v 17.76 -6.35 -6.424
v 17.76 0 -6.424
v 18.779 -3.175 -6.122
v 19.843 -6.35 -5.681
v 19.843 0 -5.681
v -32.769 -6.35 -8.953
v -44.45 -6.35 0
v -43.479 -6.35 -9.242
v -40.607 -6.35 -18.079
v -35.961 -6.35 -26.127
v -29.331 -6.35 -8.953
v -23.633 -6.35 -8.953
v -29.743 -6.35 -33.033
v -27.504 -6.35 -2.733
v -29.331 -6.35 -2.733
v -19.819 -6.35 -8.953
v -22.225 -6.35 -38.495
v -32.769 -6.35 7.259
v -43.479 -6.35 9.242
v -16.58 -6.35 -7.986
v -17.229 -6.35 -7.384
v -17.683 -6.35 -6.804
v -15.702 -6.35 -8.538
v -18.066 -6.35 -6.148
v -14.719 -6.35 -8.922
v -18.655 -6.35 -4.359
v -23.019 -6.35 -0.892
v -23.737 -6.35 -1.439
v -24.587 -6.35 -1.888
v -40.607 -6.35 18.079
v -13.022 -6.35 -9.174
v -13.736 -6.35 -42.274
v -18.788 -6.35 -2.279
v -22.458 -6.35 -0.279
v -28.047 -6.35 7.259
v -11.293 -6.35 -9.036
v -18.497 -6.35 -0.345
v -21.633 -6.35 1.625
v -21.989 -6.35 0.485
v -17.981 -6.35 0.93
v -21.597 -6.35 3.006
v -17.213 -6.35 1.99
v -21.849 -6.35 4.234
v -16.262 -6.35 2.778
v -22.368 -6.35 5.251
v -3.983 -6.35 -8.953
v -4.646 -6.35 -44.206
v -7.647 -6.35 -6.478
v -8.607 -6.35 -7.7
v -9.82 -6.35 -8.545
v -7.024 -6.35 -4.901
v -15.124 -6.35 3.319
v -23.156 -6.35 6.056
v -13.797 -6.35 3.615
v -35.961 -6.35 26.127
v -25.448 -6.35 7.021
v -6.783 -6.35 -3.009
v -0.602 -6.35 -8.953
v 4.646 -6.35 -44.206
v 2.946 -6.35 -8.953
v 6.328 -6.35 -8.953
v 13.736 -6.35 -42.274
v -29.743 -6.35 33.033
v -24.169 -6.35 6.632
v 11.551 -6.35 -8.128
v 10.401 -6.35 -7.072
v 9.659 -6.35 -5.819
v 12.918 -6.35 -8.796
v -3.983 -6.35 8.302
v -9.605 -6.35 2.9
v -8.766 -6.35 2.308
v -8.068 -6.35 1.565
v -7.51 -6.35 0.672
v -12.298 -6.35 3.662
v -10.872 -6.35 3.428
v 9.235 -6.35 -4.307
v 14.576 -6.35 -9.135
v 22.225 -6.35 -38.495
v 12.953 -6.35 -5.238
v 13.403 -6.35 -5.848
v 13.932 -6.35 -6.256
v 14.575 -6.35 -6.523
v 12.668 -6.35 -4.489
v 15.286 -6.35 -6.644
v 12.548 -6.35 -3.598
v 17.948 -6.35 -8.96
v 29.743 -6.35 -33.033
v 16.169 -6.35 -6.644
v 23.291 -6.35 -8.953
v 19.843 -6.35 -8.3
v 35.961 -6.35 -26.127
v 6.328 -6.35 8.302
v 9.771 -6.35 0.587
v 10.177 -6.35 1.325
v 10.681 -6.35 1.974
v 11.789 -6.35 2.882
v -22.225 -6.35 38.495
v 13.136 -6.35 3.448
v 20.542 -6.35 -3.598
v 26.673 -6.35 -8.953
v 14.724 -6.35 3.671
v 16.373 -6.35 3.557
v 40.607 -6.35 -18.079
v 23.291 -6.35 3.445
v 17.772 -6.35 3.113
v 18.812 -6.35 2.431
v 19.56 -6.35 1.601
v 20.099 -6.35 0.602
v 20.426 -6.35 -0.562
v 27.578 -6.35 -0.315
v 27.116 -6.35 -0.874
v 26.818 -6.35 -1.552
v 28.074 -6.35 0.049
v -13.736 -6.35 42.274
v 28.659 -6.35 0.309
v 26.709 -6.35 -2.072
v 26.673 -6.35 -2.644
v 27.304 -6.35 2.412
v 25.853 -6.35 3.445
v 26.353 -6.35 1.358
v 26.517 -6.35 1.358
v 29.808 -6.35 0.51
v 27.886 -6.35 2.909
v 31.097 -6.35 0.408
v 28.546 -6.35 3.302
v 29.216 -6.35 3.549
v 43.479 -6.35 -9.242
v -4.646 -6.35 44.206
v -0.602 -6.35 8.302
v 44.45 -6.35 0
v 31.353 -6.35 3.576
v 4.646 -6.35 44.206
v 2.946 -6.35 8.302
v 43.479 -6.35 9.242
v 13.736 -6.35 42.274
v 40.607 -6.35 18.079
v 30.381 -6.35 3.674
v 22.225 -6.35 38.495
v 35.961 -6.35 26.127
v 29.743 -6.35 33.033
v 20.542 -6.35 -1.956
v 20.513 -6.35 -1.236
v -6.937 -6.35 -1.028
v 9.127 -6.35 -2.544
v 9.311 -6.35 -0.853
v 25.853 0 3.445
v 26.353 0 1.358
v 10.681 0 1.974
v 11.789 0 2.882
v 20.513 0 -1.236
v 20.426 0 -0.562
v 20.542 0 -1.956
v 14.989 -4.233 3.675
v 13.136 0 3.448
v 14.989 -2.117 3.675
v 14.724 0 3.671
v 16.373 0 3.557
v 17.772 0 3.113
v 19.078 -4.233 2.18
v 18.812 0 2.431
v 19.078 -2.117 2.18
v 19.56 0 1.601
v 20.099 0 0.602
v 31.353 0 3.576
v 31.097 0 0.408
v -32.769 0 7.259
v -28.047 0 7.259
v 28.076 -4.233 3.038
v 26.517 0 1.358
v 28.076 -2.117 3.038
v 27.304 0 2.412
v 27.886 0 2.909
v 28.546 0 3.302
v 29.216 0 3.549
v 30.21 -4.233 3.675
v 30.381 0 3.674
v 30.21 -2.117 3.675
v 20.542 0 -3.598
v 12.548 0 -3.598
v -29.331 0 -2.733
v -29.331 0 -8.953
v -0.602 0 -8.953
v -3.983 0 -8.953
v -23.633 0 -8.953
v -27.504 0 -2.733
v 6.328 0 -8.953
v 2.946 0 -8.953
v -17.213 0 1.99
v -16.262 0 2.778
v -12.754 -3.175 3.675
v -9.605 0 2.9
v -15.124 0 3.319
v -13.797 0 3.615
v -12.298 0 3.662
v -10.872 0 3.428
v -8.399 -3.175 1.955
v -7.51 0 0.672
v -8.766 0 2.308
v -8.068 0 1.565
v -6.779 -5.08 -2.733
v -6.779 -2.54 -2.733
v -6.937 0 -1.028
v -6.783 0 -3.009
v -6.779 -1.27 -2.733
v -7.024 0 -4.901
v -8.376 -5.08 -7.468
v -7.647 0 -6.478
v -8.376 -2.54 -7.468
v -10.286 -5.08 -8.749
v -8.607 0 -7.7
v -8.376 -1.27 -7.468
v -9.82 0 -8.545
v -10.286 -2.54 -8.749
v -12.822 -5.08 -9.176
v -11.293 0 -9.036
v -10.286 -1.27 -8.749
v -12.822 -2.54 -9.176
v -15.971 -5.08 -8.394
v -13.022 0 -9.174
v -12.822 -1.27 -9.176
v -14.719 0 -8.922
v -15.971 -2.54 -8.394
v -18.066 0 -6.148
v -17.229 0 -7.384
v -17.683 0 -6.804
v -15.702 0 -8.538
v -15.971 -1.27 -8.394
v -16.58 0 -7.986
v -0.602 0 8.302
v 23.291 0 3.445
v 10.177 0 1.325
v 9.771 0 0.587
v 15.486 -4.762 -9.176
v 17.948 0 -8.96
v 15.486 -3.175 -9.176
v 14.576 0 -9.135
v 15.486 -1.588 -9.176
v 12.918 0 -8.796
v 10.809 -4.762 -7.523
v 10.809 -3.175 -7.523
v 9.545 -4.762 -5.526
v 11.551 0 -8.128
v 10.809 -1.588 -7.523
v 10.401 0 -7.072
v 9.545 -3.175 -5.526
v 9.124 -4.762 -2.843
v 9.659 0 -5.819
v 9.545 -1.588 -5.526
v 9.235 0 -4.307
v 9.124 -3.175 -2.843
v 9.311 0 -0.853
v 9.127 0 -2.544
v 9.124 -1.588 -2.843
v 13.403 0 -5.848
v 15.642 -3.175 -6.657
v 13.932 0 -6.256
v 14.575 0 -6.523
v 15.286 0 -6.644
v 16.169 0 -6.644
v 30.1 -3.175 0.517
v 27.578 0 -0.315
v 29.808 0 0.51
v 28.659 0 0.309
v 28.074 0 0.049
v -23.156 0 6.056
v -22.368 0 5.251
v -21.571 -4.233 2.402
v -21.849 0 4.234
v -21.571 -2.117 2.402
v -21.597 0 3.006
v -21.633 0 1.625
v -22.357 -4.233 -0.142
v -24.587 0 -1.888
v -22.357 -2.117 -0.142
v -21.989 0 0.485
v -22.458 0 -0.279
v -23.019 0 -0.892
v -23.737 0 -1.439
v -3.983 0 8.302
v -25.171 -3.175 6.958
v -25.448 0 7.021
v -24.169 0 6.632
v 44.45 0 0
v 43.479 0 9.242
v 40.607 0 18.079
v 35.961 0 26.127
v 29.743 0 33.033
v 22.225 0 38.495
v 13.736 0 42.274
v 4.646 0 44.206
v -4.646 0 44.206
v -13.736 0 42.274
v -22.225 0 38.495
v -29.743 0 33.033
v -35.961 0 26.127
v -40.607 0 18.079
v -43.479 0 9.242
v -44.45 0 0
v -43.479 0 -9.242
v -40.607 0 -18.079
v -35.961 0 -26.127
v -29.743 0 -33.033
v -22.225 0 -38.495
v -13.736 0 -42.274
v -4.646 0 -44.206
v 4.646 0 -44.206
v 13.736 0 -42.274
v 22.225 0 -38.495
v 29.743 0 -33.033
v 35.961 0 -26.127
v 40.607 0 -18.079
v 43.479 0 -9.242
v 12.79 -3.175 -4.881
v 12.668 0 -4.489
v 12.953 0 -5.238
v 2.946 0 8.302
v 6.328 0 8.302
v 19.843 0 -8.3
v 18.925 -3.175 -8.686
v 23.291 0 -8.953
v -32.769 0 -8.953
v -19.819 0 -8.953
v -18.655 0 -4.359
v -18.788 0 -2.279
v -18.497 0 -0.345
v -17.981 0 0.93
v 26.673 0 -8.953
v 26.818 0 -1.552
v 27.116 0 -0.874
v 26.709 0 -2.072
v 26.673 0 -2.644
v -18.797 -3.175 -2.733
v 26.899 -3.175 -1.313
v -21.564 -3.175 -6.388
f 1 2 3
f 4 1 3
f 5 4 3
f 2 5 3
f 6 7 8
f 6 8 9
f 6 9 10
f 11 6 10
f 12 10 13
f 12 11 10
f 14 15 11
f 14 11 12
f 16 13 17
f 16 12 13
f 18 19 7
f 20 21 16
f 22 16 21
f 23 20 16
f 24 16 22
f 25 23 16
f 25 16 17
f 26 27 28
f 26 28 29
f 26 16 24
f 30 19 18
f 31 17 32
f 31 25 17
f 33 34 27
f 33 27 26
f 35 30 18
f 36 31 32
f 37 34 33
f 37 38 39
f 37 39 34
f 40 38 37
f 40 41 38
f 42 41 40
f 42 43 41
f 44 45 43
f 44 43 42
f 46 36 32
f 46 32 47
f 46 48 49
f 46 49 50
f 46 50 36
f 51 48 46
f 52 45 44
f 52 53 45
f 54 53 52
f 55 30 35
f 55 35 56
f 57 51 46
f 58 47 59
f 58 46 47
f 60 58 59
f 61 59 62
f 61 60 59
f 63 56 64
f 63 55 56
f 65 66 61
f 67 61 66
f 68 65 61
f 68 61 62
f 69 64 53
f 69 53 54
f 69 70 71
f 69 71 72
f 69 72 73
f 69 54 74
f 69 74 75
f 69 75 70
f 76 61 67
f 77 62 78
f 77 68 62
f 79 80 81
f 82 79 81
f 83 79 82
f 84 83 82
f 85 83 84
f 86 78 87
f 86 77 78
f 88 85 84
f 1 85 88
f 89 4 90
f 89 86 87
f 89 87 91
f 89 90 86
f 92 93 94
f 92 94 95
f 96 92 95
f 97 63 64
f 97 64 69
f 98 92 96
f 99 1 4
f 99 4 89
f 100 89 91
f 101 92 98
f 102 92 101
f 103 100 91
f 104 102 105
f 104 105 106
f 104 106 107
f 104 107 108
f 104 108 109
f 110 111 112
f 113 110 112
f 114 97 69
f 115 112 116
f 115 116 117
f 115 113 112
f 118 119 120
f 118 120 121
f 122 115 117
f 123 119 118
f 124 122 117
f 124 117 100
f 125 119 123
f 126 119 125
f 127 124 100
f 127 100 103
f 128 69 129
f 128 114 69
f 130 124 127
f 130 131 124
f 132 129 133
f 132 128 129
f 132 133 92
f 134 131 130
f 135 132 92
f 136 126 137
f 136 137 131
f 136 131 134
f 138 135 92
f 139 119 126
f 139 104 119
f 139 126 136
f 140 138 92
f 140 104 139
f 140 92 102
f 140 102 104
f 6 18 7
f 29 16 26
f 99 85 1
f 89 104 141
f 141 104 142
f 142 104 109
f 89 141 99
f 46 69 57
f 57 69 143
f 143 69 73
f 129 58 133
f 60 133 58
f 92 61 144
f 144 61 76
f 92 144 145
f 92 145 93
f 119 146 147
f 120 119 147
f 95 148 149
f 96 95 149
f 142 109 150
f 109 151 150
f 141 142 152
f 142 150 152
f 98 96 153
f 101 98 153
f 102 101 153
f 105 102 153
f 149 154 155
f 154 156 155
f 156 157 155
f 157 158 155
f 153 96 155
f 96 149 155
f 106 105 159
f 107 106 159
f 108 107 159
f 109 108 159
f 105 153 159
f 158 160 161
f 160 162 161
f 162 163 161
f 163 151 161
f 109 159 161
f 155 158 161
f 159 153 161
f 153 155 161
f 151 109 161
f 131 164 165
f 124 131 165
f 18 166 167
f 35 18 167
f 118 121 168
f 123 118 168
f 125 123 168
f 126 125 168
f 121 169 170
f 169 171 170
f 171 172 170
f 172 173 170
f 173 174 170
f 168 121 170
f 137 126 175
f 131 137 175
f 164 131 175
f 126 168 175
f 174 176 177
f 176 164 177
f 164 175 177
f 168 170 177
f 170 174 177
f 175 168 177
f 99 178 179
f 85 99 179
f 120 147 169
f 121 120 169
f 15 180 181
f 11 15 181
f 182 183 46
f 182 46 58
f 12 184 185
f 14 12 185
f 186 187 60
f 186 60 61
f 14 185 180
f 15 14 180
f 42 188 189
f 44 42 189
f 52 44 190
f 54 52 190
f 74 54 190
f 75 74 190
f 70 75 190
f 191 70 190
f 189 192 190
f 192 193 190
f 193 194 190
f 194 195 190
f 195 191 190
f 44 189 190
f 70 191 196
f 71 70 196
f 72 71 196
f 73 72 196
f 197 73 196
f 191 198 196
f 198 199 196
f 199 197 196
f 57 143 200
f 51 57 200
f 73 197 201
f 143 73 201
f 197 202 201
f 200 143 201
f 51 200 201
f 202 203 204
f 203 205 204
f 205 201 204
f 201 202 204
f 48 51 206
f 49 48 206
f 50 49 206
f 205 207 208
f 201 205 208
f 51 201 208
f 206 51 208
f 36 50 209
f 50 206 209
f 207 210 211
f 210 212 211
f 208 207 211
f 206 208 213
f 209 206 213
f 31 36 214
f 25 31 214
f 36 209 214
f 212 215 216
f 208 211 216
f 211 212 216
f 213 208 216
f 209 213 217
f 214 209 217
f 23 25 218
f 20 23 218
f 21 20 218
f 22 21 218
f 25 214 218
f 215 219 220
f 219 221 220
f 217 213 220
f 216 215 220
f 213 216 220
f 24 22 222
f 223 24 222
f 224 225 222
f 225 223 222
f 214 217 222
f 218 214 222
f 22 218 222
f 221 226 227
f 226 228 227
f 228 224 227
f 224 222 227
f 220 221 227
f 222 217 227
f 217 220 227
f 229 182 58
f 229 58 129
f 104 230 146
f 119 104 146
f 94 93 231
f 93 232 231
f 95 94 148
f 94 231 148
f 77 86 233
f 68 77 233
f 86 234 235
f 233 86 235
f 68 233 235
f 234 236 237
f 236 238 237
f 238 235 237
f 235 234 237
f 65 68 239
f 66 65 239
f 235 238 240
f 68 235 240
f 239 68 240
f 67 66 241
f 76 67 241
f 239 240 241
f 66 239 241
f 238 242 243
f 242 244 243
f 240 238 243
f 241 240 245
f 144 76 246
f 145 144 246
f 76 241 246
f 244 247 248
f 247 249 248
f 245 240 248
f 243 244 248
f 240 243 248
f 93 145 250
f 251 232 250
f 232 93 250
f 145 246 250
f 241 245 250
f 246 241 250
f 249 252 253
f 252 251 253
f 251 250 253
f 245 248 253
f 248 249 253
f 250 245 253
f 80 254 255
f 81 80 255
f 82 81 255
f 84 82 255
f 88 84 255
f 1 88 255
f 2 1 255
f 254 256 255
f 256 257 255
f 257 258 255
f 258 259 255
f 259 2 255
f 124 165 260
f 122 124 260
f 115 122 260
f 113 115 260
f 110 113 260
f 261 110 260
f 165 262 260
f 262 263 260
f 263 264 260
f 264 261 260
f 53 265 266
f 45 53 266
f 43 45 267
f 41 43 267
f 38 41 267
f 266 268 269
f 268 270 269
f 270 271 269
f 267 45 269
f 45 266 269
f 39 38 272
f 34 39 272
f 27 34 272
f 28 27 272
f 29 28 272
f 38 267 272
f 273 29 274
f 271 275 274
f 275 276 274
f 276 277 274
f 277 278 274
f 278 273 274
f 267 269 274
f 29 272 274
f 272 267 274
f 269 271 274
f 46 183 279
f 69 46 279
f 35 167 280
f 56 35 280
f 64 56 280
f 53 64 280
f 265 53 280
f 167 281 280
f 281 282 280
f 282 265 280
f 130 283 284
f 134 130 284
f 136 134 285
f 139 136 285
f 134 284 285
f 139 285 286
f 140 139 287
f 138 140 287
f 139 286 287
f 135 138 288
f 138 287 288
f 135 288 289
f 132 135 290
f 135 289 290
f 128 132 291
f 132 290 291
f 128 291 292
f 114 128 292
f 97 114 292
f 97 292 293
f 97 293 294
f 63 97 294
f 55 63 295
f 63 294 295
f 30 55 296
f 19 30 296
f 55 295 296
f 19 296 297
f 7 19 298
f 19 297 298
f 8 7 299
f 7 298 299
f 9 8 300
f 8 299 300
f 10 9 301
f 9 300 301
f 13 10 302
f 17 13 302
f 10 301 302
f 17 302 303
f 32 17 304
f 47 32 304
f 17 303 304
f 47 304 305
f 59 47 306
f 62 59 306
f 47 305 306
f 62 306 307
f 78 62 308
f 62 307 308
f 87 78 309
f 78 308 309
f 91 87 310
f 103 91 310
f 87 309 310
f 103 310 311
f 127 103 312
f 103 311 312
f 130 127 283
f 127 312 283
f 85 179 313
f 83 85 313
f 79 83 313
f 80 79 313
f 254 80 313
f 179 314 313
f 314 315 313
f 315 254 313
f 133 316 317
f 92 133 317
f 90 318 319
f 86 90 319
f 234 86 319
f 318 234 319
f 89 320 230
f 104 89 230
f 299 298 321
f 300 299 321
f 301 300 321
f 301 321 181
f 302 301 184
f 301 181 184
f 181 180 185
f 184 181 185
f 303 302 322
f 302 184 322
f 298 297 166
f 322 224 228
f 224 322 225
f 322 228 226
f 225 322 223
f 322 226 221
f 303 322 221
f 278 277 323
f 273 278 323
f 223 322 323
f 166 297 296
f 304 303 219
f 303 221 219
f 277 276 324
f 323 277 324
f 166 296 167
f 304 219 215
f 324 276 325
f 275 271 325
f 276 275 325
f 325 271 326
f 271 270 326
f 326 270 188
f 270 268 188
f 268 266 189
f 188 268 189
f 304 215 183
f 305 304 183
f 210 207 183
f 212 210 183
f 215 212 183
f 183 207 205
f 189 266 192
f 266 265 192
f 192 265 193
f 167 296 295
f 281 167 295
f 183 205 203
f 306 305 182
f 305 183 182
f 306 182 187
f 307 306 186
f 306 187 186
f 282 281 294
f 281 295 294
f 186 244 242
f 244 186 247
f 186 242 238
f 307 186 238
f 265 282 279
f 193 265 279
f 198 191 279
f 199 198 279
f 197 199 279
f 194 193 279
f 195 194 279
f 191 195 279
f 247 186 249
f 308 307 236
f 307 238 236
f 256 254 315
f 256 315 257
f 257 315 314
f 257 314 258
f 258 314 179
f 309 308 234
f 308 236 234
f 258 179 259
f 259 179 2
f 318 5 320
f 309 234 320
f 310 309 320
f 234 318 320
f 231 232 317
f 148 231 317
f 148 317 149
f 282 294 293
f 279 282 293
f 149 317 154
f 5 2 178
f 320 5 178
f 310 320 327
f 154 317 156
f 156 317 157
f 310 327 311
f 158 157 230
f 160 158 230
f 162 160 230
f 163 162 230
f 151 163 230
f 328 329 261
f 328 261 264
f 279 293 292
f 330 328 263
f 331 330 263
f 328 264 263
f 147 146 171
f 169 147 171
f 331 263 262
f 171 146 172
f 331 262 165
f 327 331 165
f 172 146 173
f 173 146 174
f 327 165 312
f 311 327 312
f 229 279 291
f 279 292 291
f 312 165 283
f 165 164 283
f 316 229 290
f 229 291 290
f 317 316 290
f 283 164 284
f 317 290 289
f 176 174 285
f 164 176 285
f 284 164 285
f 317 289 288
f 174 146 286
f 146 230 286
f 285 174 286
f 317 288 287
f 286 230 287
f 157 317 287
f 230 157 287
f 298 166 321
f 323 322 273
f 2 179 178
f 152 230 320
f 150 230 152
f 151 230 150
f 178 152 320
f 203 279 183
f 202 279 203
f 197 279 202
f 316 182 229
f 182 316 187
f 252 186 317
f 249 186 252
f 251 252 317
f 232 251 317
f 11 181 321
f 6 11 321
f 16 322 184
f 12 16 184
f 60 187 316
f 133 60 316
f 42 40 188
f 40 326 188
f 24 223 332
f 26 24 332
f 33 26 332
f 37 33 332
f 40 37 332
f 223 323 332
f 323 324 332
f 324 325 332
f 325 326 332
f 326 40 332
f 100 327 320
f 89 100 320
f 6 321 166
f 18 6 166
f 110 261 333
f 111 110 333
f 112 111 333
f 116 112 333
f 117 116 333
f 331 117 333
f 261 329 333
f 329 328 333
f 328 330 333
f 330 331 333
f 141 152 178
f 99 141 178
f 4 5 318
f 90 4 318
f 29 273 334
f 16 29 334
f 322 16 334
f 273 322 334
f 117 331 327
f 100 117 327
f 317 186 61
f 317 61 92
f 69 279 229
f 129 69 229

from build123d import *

# Parameters (mm, degrees)
F0_R     = 44.45
F0_W     = 3.3813905481
F0_H     = 17.2546718104
F1_DEPTH = 6.35


with BuildPart() as f1:
    # F0 (on Front) → F1 (new body)
    with BuildSketch(Plane.XZ):
        Circle(F0_R)
        with BuildLine():
            Line((-27.5039295863, -2.7326104788), (-29.3312287807, -2.7326104788))
            Line((-29.3312287807, -2.7326104788), (-29.3312287807, -8.9525240473))
            Line((-29.3312287807, -8.9525240473), (-32.7693897892, -8.9525240473))
            Line((-32.7693897892, -8.9525240473), (-32.7693897892, 7.2589905531))
            Line((-32.7693897892, 7.2589905531), (-28.046797114, 7.2589905531))
            add(Edge.make_bspline(
                [(-28.046797114, 7.2589905531), (-24.7399177952, 7.2589905531), (-23.1556671344, 6.0561664231)],
                knots=[0, 0, 0, 1, 1, 1], degree=2))
            add(Edge.make_bspline(
                [(-23.1556671344, 6.0561664231), (-21.5714164736, 4.8533422932), (-21.5714164736, 2.4015680344)],
                knots=[0, 0, 0, 1, 1, 1], degree=2))
            add(Edge.make_bspline(
                [(-21.5714164736, 2.4015680344), (-21.5714164736, 0.9716620628), (-22.3573325349, -0.1424582227)],
                knots=[0, 0, 0, 1, 1, 1], degree=2))
            add(Edge.make_bspline(
                [(-22.3573325349, -0.1424582227), (-23.1432485962, -1.2565785082), (-24.5873471828, -1.8881498803)],
                knots=[0, 0, 0, 1, 1, 1], degree=2))
            add(Edge.make_bspline(
                [(-24.5873471828, -1.8881498803), (-20.9256524865, -7.3558548484), (-19.8186285085, -8.9525240473)],
                knots=[0, 0, 0, 1, 1, 1], degree=2))
            Line((-19.8186285085, -8.9525240473), (-23.6328938172, -8.9525240473))
            Line((-23.6328938172, -8.9525240473), (-27.5039295863, -2.7326104788))
        make_face(mode=Mode.SUBTRACT)
        with BuildLine():
            add(Edge.make_bspline(
                [(-7.5100830612, 0.6718430688), (-6.7791633834, -0.7811259023), (-6.7791633834, -2.7326104788)],
                knots=[0, 0, 0, 1, 1, 1], degree=2))
            add(Edge.make_bspline(
                [(-6.7791633834, -2.7326104788), (-6.7791633834, -5.7591856494), (-8.3758325824, -7.4676216923)],
                knots=[0, 0, 0, 1, 1, 1], degree=2))
            add(Edge.make_bspline(
                [(-8.3758325824, -7.4676216923), (-9.9725017814, -9.1760577352), (-12.8216692632, -9.1760577352)],
                knots=[0, 0, 0, 1, 1, 1], degree=2))
            add(Edge.make_bspline(
                [(-12.8216692632, -9.1760577352), (-14.6063906122, -9.1760577352), (-15.9706557389, -8.3936898277)],
                knots=[0, 0, 0, 1, 1, 1], degree=2))
            add(Edge.make_bspline(
                [(-15.9706557389, -8.3936898277), (-17.3349208656, -7.6113219202), (-18.0658405434, -6.1477084878)],
                knots=[0, 0, 0, 1, 1, 1], degree=2))
            add(Edge.make_bspline(
                [(-18.0658405434, -6.1477084878), (-18.7967602211, -4.6840950554), (-18.7967602211, -2.7326104788)],
                knots=[0, 0, 0, 1, 1, 1], degree=2))
            add(Edge.make_bspline(
                [(-18.7967602211, -2.7326104788), (-18.7967602211, 0.304609153), (-17.2125095604, 1.9899821964)],
                knots=[0, 0, 0, 1, 1, 1], degree=2))
            add(Edge.make_bspline(
                [(-17.2125095604, 1.9899821964), (-15.6282588996, 3.6753552398), (-12.7542543414, 3.6753552398)],
                knots=[0, 0, 0, 1, 1, 1], degree=2))
            add(Edge.make_bspline(
                [(-12.7542543414, 3.6753552398), (-10.9695329923, 3.6753552398), (-9.6052678656, 2.9000836398)],
                knots=[0, 0, 0, 1, 1, 1], degree=2))
            add(Edge.make_bspline(
                [(-9.6052678656, 2.9000836398), (-8.2410027389, 2.1248120399), (-7.5100830612, 0.6718430688)],
                knots=[0, 0, 0, 1, 1, 1], degree=2))
        make_face(mode=Mode.SUBTRACT)
        with Locations((-2.2925229343, -0.3251881421)):
            Rectangle(F0_W, F0_H, mode=Mode.SUBTRACT)
        with Locations((4.6370213893, -0.3251881421)):
            Rectangle(F0_W, F0_H, mode=Mode.SUBTRACT)
        with BuildLine():
            add(Edge.make_bspline(
                [(17.9479202783, -8.9596203549), (16.940244606, -9.1760577352), (15.485501558, -9.1760577352)],
                knots=[0, 0, 0, 1, 1, 1], degree=2))
            add(Edge.make_bspline(
                [(15.485501558, -9.1760577352), (12.4944079253, -9.1760577352), (10.8090348819, -7.5226180758)],
                knots=[0, 0, 0, 1, 1, 1], degree=2))
            add(Edge.make_bspline(
                [(10.8090348819, -7.5226180758), (9.1236618385, -5.8691784164), (9.1236618385, -2.8426032459)],
                knots=[0, 0, 0, 1, 1, 1], degree=2))
            add(Edge.make_bspline(
                [(9.1236618385, -2.8426032459), (9.1236618385, 0.272675769), (10.681301346, 1.9740155044)],
                knots=[0, 0, 0, 1, 1, 1], degree=2))
            add(Edge.make_bspline(
                [(10.681301346, 1.9740155044), (12.2389408534, 3.6753552398), (14.9887600295, 3.6753552398)],
                knots=[0, 0, 0, 1, 1, 1], degree=2))
            add(Edge.make_bspline(
                [(14.9887600295, 3.6753552398), (17.6143938234, 3.6753552398), (19.0780072558, 2.1798084234)],
                knots=[0, 0, 0, 1, 1, 1], degree=2))
            add(Edge.make_bspline(
                [(19.0780072558, 2.1798084234), (20.5416206882, 0.684261607), (20.5416206882, -1.955564802)],
                knots=[0, 0, 0, 1, 1, 1], degree=2))
            Line((20.5416206882, -1.955564802), (20.5416206882, -3.5983600001))
            Line((20.5416206882, -3.5983600001), (12.5476302319, -3.5983600001))
            add(Edge.make_bspline(
                [(12.5476302319, -3.5983600001), (12.6044006923, -5.0389104329), (13.4027352918, -5.8478894938)],
                knots=[0, 0, 0, 1, 1, 1], degree=2))
            add(Edge.make_bspline(
                [(13.4027352918, -5.8478894938), (14.2010698913, -6.6568685546), (15.6416203242, -6.6568685546)],
                knots=[0, 0, 0, 1, 1, 1], degree=2))
            add(Edge.make_bspline(
                [(15.6416203242, -6.6568685546), (16.7628369172, -6.6568685546), (17.7598681281, -6.4244644823)],
                knots=[0, 0, 0, 1, 1, 1], degree=2))
            add(Edge.make_bspline(
                [(17.7598681281, -6.4244644823), (18.7568993391, -6.19206041), (19.8426343944, -5.6811262663)],
                knots=[0, 0, 0, 1, 1, 1], degree=2))
            Line((19.8426343944, -5.6811262663), (19.8426343944, -8.2996637526))
            add(Edge.make_bspline(
                [(19.8426343944, -8.2996637526), (18.9555959505, -8.7431829746), (17.9479202783, -8.9596203549)],
                knots=[0, 0, 0, 1, 1, 1], degree=2))
        make_face(mode=Mode.SUBTRACT)
        with BuildLine():
            add(Edge.make_bspline(
                [(28.0761252305, 3.0384616371), (29.0571897494, 3.6753552398), (30.2103397265, 3.6753552398)],
                knots=[0, 0, 0, 1, 1, 1], degree=2))
            add(Edge.make_bspline(
                [(30.2103397265, 3.6753552398), (30.8986815589, 3.6753552398), (31.3528452422, 3.5760069341)],
                knots=[0, 0, 0, 1, 1, 1], degree=2))
            Line((31.3528452422, 3.5760069341), (31.0973781704, 0.4075056125))
            add(Edge.make_bspline(
                [(31.0973781704, 0.4075056125), (30.6857923324, 0.5174983795), (30.1003469594, 0.5174983795)],
                knots=[0, 0, 0, 1, 1, 1], degree=2))
            add(Edge.make_bspline(
                [(30.1003469594, 0.5174983795), (28.4823888378, 0.5174983795), (27.577609625, -0.3145436808)],
                knots=[0, 0, 0, 1, 1, 1], degree=2))
            add(Edge.make_bspline(
                [(27.577609625, -0.3145436808), (26.6728304123, -1.1465857412), (26.6728304123, -2.6439066345)],
                knots=[0, 0, 0, 1, 1, 1], degree=2))
            Line((26.6728304123, -2.6439066345), (26.6728304123, -8.9525240473))
            Line((26.6728304123, -8.9525240473), (23.2914398642, -8.9525240473))
            Line((23.2914398642, -8.9525240473), (23.2914398642, 3.4447252444))
            Line((23.2914398642, 3.4447252444), (25.8532068901, 3.4447252444))
            Line((25.8532068901, 3.4447252444), (26.3534965725, 1.3584108243))
            Line((26.3534965725, 1.3584108243), (26.5167116462, 1.3584108243))
            add(Edge.make_bspline(
                [(26.5167116462, 1.3584108243), (27.0950607116, 2.4015680344), (28.0761252305, 3.0384616371)],
                knots=[0, 0, 0, 1, 1, 1], degree=2))
        make_face(mode=Mode.SUBTRACT)
    extrude(amount=F1_DEPTH)


solid = f1.part
